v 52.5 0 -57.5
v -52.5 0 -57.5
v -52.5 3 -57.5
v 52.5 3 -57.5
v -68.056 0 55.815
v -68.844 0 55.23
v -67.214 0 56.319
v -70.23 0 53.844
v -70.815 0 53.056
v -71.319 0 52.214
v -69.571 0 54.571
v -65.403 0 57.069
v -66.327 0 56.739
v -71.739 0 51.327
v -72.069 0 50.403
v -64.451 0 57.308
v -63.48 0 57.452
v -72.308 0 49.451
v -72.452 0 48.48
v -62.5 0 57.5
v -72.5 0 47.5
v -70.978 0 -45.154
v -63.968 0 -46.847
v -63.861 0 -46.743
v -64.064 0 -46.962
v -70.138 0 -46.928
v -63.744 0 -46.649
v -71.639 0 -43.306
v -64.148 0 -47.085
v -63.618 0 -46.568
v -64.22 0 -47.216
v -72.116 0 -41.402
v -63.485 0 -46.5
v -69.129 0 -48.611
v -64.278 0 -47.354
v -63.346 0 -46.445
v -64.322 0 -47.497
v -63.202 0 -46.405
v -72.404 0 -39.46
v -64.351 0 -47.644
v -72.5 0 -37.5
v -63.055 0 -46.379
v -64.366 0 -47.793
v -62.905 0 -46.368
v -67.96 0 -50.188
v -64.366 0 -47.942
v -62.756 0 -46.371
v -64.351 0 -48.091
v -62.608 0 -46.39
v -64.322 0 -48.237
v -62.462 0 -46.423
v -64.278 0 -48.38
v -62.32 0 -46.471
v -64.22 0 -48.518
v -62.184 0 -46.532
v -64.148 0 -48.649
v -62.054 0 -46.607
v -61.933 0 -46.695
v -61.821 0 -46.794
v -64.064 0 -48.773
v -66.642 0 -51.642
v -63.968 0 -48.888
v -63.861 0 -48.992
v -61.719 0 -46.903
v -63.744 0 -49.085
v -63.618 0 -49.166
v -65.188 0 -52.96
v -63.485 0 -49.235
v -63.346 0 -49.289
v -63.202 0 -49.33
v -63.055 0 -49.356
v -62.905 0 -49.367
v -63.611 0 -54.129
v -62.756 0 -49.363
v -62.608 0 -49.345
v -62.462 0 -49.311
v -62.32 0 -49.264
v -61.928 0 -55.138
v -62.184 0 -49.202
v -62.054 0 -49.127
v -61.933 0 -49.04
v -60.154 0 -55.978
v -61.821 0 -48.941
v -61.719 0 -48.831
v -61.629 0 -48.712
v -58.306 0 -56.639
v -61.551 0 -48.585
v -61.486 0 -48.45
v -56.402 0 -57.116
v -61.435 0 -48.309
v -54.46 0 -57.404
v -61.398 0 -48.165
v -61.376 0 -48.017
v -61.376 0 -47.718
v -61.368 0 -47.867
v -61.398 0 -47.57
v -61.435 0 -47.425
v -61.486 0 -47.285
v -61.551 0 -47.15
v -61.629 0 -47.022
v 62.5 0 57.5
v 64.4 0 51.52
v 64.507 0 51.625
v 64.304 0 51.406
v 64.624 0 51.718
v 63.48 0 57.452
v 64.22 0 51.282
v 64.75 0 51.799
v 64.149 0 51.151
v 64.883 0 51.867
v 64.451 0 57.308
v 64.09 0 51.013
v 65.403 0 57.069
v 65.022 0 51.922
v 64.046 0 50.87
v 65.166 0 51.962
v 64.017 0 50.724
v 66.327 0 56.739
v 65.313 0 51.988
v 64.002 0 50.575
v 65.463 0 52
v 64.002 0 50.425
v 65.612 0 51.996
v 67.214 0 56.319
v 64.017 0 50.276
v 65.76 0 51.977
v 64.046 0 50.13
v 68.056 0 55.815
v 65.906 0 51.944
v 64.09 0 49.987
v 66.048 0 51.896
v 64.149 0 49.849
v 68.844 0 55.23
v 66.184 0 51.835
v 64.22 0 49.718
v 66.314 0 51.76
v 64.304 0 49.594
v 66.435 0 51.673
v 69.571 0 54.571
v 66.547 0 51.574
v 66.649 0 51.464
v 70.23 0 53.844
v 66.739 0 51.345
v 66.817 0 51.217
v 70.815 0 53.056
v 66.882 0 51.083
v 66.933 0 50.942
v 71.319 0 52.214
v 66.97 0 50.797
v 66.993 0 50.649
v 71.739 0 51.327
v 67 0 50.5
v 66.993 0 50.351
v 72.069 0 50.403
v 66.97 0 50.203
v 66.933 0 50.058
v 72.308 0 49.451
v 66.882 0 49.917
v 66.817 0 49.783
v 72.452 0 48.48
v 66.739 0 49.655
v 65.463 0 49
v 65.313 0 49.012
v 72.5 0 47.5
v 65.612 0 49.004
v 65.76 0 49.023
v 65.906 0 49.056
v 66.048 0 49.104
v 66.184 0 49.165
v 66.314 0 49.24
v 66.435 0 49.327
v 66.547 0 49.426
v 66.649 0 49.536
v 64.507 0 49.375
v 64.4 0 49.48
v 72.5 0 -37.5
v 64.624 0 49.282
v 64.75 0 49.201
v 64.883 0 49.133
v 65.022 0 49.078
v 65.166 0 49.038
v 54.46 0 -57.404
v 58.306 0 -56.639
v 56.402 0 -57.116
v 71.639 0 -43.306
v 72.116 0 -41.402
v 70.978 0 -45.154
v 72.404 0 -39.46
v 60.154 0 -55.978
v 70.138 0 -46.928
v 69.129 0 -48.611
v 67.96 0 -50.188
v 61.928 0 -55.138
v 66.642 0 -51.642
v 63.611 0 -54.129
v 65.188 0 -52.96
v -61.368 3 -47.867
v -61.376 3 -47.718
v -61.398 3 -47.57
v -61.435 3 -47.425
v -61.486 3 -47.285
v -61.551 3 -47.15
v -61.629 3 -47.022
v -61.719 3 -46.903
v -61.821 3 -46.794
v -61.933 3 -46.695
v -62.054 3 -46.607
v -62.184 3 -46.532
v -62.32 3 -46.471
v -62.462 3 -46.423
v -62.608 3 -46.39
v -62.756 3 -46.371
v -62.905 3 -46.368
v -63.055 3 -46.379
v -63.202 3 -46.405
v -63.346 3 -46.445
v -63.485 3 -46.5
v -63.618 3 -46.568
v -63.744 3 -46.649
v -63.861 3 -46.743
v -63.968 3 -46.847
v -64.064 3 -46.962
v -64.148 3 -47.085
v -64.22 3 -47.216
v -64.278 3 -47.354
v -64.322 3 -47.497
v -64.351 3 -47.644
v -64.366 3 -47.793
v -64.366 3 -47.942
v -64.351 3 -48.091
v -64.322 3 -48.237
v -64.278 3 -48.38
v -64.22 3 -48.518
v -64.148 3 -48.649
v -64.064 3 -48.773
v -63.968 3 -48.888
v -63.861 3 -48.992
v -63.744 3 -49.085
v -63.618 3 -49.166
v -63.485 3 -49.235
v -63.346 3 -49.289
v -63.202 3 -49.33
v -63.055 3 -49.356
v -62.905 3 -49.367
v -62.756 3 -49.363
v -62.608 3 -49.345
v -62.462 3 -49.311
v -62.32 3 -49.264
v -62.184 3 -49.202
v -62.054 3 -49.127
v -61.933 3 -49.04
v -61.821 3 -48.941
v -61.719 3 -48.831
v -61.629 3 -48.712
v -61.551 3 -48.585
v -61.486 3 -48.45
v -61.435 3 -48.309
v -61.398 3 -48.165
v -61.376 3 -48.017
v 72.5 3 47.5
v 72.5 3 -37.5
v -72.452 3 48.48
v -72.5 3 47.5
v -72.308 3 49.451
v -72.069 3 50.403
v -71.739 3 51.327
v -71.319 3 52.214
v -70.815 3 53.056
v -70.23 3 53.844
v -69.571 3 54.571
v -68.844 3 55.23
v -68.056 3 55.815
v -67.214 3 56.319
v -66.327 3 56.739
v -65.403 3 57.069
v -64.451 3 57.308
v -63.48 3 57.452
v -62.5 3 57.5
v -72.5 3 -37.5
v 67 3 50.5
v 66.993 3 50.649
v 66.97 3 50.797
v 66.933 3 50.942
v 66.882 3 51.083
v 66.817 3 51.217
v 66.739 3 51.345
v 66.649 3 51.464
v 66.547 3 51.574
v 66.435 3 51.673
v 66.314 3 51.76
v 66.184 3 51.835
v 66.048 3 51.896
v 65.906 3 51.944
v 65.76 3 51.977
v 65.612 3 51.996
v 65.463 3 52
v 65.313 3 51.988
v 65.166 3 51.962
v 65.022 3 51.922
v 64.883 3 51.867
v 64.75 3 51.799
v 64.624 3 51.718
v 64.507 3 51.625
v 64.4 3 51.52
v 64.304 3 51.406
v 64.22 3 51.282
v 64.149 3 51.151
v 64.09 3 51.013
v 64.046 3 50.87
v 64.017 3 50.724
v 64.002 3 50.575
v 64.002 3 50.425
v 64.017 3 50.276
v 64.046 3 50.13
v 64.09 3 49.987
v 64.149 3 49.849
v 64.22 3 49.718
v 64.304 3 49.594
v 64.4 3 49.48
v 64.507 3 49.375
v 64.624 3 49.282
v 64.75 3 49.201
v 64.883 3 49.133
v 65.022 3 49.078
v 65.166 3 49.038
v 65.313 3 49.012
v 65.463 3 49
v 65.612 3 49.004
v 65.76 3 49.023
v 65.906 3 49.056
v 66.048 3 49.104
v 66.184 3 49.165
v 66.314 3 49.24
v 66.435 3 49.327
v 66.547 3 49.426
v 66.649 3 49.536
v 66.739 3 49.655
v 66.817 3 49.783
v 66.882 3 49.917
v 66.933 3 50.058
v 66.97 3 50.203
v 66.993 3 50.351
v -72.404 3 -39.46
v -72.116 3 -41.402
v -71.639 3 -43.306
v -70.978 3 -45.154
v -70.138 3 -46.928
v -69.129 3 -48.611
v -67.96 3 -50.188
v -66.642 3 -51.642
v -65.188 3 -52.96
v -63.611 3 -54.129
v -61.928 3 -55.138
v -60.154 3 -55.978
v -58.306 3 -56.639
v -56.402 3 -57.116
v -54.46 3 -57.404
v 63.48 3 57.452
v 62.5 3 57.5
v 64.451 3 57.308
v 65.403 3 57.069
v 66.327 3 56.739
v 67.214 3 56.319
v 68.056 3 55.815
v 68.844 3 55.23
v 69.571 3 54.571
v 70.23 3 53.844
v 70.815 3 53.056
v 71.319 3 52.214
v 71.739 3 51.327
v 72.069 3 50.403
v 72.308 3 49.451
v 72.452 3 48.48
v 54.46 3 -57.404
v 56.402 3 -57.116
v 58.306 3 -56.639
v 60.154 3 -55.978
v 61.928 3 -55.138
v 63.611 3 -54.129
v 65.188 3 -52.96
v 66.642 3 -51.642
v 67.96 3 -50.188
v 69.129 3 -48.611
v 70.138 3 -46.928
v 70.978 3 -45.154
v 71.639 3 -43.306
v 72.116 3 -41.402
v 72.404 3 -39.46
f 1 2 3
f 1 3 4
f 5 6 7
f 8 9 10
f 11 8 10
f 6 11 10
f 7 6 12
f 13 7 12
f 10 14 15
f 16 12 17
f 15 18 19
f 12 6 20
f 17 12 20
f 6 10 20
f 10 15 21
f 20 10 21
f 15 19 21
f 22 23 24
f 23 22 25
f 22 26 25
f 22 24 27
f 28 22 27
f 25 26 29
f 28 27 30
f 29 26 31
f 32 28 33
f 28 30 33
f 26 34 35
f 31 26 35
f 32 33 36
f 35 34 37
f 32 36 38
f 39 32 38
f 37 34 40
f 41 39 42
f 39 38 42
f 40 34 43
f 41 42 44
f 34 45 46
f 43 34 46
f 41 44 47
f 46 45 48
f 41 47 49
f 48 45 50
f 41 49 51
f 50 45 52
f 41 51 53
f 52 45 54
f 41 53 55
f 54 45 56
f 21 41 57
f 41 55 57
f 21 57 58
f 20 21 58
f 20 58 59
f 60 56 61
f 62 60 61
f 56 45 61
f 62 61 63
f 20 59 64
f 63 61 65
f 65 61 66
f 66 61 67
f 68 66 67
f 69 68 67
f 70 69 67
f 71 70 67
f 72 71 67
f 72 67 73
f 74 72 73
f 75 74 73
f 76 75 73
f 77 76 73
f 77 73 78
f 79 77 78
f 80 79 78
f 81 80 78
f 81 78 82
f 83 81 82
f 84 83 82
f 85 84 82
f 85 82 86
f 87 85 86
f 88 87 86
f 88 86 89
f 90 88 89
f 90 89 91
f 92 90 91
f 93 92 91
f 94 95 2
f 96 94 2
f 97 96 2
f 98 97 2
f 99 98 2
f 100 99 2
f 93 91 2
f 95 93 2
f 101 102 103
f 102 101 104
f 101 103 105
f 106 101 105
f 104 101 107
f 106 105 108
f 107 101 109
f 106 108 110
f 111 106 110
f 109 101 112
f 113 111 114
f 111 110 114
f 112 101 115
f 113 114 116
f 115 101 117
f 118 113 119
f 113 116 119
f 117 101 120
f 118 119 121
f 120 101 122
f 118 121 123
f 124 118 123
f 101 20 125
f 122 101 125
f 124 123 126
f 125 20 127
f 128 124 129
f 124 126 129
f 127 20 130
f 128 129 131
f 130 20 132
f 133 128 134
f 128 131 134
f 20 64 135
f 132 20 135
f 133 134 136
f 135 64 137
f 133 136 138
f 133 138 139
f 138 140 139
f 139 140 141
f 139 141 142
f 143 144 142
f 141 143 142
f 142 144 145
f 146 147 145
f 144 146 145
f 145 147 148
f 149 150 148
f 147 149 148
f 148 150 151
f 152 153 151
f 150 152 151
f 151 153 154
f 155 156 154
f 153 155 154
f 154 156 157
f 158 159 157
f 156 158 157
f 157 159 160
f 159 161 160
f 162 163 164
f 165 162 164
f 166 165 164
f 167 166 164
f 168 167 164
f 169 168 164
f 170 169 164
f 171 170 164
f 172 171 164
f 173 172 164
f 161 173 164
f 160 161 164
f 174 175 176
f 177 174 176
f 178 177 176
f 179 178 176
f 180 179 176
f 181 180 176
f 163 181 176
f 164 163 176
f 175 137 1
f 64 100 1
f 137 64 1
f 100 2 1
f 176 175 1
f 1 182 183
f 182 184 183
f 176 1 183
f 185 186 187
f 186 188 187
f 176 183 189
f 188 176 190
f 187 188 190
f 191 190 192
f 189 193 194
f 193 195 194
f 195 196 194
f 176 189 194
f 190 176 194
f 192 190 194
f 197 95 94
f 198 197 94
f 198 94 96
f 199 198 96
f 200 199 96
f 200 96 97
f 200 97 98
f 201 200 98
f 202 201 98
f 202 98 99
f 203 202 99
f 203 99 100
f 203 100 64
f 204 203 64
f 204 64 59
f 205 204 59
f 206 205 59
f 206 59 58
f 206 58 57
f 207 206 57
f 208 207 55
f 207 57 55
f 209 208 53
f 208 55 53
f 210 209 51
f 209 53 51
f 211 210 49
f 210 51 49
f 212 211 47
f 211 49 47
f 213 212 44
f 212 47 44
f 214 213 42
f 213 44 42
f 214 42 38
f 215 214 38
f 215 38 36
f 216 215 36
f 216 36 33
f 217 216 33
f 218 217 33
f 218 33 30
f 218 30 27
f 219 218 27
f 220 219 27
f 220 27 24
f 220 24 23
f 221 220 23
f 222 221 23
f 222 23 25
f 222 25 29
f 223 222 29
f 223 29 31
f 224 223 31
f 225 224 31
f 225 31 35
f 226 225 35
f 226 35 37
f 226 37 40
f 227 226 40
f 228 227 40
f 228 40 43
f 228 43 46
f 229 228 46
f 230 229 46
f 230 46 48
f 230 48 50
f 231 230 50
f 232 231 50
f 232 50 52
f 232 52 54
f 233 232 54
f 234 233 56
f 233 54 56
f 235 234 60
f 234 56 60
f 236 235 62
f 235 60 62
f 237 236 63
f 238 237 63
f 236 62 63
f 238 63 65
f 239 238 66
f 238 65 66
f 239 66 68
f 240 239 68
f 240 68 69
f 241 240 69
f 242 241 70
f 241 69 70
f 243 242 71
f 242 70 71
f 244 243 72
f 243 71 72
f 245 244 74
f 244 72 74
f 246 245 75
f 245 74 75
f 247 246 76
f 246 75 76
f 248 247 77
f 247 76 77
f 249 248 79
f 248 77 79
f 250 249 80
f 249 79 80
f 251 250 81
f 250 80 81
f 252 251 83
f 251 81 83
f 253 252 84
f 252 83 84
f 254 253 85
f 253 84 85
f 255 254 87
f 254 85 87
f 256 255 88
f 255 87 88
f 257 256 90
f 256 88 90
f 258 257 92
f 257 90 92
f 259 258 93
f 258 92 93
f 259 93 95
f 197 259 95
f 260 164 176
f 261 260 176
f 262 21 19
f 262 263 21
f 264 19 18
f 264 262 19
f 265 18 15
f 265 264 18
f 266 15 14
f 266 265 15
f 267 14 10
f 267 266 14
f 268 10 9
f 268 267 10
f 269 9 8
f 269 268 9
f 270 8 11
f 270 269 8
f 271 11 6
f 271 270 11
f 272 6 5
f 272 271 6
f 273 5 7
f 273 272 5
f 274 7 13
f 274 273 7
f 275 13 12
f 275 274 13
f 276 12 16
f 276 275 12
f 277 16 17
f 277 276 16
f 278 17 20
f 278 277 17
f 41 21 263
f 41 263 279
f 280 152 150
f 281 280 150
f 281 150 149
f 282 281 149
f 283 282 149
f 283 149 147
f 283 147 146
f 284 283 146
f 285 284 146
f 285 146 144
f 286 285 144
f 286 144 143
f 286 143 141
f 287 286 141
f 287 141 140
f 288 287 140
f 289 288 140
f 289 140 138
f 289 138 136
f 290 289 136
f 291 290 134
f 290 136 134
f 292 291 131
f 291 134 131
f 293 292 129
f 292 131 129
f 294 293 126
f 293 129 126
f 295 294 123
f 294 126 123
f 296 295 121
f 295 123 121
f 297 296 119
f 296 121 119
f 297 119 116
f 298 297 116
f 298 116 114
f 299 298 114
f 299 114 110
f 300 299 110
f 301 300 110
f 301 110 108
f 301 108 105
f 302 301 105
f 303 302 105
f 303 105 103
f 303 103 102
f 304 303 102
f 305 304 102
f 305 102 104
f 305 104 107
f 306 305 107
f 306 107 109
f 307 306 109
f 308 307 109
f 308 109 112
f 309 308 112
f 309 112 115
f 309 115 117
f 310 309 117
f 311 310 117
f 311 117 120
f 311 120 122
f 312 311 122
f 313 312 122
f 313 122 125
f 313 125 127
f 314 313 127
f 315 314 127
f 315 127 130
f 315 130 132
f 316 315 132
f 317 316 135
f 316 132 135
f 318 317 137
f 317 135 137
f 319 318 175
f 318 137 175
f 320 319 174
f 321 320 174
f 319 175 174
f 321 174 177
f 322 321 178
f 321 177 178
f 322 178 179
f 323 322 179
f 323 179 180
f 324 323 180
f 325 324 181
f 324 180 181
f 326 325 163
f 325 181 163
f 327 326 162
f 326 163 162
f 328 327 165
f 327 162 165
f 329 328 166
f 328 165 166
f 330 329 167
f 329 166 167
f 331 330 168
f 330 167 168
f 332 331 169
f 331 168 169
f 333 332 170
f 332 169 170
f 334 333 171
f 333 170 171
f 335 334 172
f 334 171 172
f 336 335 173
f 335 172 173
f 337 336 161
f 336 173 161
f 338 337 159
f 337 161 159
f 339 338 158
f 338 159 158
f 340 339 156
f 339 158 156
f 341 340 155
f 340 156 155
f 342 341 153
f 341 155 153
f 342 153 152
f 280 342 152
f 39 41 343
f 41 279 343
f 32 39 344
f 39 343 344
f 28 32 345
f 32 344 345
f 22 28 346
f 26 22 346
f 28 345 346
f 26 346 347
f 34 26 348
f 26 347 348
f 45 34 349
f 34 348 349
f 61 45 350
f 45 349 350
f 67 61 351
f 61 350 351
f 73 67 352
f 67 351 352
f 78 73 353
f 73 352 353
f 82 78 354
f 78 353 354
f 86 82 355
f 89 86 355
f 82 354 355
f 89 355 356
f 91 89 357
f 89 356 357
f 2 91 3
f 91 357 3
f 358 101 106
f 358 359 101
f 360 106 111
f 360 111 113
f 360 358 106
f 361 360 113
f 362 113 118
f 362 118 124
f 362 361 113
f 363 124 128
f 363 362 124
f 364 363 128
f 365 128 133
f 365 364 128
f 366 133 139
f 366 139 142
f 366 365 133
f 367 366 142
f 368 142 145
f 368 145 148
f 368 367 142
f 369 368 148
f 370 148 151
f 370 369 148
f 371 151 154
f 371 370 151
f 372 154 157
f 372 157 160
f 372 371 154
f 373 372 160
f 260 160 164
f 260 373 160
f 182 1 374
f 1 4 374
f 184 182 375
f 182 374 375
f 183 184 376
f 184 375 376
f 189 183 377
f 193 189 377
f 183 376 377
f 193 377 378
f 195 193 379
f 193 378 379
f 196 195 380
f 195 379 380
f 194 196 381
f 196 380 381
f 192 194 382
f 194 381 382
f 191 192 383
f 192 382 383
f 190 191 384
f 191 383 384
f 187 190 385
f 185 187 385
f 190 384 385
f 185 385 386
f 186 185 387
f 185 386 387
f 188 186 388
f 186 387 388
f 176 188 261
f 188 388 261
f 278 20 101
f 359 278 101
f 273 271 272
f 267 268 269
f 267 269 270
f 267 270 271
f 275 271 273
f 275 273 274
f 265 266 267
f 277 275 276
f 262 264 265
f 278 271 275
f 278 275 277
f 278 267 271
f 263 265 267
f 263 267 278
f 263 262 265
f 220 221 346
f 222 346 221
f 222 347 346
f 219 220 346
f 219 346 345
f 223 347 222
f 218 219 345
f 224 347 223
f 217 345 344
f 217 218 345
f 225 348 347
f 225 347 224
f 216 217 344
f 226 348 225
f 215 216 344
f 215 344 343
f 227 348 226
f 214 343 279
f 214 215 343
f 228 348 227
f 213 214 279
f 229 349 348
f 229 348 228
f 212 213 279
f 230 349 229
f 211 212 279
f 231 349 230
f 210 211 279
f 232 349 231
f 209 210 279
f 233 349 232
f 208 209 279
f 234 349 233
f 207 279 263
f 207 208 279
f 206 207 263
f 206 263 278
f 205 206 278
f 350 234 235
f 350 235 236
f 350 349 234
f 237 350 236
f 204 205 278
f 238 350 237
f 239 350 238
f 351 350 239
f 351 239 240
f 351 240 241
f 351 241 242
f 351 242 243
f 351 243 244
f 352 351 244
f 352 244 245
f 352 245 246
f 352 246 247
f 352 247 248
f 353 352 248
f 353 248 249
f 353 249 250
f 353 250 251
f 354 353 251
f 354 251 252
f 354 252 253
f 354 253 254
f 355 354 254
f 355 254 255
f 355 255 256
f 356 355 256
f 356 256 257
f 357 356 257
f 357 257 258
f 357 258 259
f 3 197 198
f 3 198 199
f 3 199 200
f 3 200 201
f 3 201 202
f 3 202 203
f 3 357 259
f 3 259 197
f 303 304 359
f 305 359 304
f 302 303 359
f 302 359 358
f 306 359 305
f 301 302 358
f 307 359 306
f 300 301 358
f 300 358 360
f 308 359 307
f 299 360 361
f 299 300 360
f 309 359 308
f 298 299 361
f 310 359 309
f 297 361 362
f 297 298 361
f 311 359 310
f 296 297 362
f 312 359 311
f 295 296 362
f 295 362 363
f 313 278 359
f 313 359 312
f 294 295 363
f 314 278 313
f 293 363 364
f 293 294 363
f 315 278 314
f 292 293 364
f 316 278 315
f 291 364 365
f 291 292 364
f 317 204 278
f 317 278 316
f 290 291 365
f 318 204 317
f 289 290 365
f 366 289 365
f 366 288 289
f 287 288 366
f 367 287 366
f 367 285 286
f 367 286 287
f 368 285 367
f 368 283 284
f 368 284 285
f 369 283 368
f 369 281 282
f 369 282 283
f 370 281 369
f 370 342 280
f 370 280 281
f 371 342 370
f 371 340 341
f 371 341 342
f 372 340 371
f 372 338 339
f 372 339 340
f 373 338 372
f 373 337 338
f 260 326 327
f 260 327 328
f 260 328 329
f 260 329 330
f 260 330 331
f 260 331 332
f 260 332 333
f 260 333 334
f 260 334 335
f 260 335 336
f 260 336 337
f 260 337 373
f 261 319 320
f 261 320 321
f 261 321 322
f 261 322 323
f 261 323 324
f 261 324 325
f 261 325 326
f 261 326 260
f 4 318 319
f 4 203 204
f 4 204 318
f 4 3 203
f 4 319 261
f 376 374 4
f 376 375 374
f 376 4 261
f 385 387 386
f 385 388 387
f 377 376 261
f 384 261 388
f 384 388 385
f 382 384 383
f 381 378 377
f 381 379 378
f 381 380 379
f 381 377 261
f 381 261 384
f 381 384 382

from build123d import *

# Parameters (mm, degrees)
SKETCH1_W           = 145
SKETCH1_H           = 115
BOSS_EXTRUDE1_DEPTH = 3
FILLET1_R           = 10
FILLET2_R           = 20
CUT_EXTRUDE1_REACH  = 5
SKETCH2_R           = 1.5


with BuildPart() as part:
    # Sketch1 → Boss-Extrude1 (new body)
    with BuildSketch(Plane(origin=(0, 0, 0), x_dir=(1, 0, 0), z_dir=(0, 1, 0))):
        Rectangle(SKETCH1_W, SKETCH1_H)
    extrude(amount=BOSS_EXTRUDE1_DEPTH)

    # Fillet1
    fillet1_edges = [part.edges().sort_by_distance(p)[0] for p in [
        (72.5, 1.5, 57.5),
        (-72.5, 1.5, 57.5),
    ]]
    fillet(fillet1_edges, radius=FILLET1_R)

    # Fillet2
    fillet2_edges = [part.edges().sort_by_distance(p)[0] for p in [
        (-72.5, 1.5, -57.5),
        (72.5, 1.5, -57.5),
    ]]
    fillet(fillet2_edges, radius=FILLET2_R)

    # Sketch2 → Cut-Extrude1 (cut, up to next)
    with BuildSketch(Plane.XZ, mode=Mode.PRIVATE) as cut_extrude1_sk1:
        with Locations((65.5, 50.5)):
            Circle(SKETCH2_R)
    cut_extrude1_tool1 = extrude(cut_extrude1_sk1.sketch, amount=-CUT_EXTRUDE1_REACH, mode=Mode.PRIVATE) & part.part
    add(cut_extrude1_tool1.solids().sort_by_distance((65.5, 0, 50.5))[0], mode=Mode.SUBTRACT)
    # Sketch2 → Cut-Extrude1 (cut, up to next)
    with BuildSketch(Plane.XZ, mode=Mode.PRIVATE) as cut_extrude1_sk2:
        with Locations((-62.868103764, -47.867300771)):
            Circle(SKETCH2_R)
    cut_extrude1_tool2 = extrude(cut_extrude1_sk2.sketch, amount=-CUT_EXTRUDE1_REACH, mode=Mode.PRIVATE) & part.part
    add(cut_extrude1_tool2.solids().sort_by_distance((-62.868104, 0, -47.867301))[0], mode=Mode.SUBTRACT)


solid = part.part
